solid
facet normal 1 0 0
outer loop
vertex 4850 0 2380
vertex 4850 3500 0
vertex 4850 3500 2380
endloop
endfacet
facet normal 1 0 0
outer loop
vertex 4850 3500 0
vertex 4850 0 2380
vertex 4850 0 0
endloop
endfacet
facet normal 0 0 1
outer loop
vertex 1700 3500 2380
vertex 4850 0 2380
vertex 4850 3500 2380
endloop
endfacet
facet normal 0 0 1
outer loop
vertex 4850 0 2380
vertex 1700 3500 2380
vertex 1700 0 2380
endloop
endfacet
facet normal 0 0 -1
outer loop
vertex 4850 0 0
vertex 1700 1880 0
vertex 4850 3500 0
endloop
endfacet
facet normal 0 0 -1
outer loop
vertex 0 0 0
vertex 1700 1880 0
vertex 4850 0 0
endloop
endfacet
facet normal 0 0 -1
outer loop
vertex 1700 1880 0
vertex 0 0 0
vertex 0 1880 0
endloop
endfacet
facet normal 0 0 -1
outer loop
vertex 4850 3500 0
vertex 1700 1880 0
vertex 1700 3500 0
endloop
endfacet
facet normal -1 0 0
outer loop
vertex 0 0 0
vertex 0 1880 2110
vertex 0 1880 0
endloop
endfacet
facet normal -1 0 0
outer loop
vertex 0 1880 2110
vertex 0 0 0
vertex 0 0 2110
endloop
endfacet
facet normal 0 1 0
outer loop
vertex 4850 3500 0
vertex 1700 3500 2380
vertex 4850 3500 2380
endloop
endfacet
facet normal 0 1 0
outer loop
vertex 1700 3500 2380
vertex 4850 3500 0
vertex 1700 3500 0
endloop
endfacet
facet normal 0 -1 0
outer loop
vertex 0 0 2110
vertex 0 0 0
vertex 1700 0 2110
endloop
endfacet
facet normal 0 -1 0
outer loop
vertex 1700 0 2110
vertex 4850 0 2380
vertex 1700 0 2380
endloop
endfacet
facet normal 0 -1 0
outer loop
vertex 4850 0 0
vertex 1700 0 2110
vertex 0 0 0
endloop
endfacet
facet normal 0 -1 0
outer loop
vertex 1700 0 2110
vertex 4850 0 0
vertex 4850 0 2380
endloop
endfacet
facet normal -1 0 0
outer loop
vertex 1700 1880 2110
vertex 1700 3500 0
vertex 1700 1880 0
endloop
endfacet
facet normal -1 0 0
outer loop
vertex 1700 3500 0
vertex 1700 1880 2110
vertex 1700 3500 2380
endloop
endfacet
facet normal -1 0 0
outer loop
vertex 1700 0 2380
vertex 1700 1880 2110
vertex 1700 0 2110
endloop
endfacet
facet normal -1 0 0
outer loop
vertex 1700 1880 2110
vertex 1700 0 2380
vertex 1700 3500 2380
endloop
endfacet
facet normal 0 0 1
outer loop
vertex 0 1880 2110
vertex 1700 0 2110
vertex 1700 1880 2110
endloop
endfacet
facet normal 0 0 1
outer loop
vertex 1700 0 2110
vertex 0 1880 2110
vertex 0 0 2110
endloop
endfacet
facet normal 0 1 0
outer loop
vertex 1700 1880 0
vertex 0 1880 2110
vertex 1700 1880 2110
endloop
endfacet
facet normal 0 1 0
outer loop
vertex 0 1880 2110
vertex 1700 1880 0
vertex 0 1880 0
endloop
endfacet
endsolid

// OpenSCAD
utgangsdorvegg = 1880;
dodorvegg = 1700;
sengekortvegg = 1620;
sengelangvegg = 3150;
langvegg = dodorvegg + sengelangvegg;
kortvegg = utgangsdorvegg + sengekortvegg;
takhoyde = 2380;
ventilasjonshoyde = 270;

// rommet
difference() {
    echo ("bruttoareal er ", langvegg*kortvegg/1000000);
    echo ("dassareal er ", dodorvegg*sengekortvegg/1000000);
    cube([langvegg,kortvegg,takhoyde]);
    // Ventilasjon
    translate([0,0,(takhoyde-ventilasjonshoyde)]) {
        cube([dodorvegg,utgangsdorvegg,270]);
    }
    // Dass
    translate([0,utgangsdorvegg,0]) {
        cube([dodorvegg,sengekortvegg,takhoyde]);
    }
}
